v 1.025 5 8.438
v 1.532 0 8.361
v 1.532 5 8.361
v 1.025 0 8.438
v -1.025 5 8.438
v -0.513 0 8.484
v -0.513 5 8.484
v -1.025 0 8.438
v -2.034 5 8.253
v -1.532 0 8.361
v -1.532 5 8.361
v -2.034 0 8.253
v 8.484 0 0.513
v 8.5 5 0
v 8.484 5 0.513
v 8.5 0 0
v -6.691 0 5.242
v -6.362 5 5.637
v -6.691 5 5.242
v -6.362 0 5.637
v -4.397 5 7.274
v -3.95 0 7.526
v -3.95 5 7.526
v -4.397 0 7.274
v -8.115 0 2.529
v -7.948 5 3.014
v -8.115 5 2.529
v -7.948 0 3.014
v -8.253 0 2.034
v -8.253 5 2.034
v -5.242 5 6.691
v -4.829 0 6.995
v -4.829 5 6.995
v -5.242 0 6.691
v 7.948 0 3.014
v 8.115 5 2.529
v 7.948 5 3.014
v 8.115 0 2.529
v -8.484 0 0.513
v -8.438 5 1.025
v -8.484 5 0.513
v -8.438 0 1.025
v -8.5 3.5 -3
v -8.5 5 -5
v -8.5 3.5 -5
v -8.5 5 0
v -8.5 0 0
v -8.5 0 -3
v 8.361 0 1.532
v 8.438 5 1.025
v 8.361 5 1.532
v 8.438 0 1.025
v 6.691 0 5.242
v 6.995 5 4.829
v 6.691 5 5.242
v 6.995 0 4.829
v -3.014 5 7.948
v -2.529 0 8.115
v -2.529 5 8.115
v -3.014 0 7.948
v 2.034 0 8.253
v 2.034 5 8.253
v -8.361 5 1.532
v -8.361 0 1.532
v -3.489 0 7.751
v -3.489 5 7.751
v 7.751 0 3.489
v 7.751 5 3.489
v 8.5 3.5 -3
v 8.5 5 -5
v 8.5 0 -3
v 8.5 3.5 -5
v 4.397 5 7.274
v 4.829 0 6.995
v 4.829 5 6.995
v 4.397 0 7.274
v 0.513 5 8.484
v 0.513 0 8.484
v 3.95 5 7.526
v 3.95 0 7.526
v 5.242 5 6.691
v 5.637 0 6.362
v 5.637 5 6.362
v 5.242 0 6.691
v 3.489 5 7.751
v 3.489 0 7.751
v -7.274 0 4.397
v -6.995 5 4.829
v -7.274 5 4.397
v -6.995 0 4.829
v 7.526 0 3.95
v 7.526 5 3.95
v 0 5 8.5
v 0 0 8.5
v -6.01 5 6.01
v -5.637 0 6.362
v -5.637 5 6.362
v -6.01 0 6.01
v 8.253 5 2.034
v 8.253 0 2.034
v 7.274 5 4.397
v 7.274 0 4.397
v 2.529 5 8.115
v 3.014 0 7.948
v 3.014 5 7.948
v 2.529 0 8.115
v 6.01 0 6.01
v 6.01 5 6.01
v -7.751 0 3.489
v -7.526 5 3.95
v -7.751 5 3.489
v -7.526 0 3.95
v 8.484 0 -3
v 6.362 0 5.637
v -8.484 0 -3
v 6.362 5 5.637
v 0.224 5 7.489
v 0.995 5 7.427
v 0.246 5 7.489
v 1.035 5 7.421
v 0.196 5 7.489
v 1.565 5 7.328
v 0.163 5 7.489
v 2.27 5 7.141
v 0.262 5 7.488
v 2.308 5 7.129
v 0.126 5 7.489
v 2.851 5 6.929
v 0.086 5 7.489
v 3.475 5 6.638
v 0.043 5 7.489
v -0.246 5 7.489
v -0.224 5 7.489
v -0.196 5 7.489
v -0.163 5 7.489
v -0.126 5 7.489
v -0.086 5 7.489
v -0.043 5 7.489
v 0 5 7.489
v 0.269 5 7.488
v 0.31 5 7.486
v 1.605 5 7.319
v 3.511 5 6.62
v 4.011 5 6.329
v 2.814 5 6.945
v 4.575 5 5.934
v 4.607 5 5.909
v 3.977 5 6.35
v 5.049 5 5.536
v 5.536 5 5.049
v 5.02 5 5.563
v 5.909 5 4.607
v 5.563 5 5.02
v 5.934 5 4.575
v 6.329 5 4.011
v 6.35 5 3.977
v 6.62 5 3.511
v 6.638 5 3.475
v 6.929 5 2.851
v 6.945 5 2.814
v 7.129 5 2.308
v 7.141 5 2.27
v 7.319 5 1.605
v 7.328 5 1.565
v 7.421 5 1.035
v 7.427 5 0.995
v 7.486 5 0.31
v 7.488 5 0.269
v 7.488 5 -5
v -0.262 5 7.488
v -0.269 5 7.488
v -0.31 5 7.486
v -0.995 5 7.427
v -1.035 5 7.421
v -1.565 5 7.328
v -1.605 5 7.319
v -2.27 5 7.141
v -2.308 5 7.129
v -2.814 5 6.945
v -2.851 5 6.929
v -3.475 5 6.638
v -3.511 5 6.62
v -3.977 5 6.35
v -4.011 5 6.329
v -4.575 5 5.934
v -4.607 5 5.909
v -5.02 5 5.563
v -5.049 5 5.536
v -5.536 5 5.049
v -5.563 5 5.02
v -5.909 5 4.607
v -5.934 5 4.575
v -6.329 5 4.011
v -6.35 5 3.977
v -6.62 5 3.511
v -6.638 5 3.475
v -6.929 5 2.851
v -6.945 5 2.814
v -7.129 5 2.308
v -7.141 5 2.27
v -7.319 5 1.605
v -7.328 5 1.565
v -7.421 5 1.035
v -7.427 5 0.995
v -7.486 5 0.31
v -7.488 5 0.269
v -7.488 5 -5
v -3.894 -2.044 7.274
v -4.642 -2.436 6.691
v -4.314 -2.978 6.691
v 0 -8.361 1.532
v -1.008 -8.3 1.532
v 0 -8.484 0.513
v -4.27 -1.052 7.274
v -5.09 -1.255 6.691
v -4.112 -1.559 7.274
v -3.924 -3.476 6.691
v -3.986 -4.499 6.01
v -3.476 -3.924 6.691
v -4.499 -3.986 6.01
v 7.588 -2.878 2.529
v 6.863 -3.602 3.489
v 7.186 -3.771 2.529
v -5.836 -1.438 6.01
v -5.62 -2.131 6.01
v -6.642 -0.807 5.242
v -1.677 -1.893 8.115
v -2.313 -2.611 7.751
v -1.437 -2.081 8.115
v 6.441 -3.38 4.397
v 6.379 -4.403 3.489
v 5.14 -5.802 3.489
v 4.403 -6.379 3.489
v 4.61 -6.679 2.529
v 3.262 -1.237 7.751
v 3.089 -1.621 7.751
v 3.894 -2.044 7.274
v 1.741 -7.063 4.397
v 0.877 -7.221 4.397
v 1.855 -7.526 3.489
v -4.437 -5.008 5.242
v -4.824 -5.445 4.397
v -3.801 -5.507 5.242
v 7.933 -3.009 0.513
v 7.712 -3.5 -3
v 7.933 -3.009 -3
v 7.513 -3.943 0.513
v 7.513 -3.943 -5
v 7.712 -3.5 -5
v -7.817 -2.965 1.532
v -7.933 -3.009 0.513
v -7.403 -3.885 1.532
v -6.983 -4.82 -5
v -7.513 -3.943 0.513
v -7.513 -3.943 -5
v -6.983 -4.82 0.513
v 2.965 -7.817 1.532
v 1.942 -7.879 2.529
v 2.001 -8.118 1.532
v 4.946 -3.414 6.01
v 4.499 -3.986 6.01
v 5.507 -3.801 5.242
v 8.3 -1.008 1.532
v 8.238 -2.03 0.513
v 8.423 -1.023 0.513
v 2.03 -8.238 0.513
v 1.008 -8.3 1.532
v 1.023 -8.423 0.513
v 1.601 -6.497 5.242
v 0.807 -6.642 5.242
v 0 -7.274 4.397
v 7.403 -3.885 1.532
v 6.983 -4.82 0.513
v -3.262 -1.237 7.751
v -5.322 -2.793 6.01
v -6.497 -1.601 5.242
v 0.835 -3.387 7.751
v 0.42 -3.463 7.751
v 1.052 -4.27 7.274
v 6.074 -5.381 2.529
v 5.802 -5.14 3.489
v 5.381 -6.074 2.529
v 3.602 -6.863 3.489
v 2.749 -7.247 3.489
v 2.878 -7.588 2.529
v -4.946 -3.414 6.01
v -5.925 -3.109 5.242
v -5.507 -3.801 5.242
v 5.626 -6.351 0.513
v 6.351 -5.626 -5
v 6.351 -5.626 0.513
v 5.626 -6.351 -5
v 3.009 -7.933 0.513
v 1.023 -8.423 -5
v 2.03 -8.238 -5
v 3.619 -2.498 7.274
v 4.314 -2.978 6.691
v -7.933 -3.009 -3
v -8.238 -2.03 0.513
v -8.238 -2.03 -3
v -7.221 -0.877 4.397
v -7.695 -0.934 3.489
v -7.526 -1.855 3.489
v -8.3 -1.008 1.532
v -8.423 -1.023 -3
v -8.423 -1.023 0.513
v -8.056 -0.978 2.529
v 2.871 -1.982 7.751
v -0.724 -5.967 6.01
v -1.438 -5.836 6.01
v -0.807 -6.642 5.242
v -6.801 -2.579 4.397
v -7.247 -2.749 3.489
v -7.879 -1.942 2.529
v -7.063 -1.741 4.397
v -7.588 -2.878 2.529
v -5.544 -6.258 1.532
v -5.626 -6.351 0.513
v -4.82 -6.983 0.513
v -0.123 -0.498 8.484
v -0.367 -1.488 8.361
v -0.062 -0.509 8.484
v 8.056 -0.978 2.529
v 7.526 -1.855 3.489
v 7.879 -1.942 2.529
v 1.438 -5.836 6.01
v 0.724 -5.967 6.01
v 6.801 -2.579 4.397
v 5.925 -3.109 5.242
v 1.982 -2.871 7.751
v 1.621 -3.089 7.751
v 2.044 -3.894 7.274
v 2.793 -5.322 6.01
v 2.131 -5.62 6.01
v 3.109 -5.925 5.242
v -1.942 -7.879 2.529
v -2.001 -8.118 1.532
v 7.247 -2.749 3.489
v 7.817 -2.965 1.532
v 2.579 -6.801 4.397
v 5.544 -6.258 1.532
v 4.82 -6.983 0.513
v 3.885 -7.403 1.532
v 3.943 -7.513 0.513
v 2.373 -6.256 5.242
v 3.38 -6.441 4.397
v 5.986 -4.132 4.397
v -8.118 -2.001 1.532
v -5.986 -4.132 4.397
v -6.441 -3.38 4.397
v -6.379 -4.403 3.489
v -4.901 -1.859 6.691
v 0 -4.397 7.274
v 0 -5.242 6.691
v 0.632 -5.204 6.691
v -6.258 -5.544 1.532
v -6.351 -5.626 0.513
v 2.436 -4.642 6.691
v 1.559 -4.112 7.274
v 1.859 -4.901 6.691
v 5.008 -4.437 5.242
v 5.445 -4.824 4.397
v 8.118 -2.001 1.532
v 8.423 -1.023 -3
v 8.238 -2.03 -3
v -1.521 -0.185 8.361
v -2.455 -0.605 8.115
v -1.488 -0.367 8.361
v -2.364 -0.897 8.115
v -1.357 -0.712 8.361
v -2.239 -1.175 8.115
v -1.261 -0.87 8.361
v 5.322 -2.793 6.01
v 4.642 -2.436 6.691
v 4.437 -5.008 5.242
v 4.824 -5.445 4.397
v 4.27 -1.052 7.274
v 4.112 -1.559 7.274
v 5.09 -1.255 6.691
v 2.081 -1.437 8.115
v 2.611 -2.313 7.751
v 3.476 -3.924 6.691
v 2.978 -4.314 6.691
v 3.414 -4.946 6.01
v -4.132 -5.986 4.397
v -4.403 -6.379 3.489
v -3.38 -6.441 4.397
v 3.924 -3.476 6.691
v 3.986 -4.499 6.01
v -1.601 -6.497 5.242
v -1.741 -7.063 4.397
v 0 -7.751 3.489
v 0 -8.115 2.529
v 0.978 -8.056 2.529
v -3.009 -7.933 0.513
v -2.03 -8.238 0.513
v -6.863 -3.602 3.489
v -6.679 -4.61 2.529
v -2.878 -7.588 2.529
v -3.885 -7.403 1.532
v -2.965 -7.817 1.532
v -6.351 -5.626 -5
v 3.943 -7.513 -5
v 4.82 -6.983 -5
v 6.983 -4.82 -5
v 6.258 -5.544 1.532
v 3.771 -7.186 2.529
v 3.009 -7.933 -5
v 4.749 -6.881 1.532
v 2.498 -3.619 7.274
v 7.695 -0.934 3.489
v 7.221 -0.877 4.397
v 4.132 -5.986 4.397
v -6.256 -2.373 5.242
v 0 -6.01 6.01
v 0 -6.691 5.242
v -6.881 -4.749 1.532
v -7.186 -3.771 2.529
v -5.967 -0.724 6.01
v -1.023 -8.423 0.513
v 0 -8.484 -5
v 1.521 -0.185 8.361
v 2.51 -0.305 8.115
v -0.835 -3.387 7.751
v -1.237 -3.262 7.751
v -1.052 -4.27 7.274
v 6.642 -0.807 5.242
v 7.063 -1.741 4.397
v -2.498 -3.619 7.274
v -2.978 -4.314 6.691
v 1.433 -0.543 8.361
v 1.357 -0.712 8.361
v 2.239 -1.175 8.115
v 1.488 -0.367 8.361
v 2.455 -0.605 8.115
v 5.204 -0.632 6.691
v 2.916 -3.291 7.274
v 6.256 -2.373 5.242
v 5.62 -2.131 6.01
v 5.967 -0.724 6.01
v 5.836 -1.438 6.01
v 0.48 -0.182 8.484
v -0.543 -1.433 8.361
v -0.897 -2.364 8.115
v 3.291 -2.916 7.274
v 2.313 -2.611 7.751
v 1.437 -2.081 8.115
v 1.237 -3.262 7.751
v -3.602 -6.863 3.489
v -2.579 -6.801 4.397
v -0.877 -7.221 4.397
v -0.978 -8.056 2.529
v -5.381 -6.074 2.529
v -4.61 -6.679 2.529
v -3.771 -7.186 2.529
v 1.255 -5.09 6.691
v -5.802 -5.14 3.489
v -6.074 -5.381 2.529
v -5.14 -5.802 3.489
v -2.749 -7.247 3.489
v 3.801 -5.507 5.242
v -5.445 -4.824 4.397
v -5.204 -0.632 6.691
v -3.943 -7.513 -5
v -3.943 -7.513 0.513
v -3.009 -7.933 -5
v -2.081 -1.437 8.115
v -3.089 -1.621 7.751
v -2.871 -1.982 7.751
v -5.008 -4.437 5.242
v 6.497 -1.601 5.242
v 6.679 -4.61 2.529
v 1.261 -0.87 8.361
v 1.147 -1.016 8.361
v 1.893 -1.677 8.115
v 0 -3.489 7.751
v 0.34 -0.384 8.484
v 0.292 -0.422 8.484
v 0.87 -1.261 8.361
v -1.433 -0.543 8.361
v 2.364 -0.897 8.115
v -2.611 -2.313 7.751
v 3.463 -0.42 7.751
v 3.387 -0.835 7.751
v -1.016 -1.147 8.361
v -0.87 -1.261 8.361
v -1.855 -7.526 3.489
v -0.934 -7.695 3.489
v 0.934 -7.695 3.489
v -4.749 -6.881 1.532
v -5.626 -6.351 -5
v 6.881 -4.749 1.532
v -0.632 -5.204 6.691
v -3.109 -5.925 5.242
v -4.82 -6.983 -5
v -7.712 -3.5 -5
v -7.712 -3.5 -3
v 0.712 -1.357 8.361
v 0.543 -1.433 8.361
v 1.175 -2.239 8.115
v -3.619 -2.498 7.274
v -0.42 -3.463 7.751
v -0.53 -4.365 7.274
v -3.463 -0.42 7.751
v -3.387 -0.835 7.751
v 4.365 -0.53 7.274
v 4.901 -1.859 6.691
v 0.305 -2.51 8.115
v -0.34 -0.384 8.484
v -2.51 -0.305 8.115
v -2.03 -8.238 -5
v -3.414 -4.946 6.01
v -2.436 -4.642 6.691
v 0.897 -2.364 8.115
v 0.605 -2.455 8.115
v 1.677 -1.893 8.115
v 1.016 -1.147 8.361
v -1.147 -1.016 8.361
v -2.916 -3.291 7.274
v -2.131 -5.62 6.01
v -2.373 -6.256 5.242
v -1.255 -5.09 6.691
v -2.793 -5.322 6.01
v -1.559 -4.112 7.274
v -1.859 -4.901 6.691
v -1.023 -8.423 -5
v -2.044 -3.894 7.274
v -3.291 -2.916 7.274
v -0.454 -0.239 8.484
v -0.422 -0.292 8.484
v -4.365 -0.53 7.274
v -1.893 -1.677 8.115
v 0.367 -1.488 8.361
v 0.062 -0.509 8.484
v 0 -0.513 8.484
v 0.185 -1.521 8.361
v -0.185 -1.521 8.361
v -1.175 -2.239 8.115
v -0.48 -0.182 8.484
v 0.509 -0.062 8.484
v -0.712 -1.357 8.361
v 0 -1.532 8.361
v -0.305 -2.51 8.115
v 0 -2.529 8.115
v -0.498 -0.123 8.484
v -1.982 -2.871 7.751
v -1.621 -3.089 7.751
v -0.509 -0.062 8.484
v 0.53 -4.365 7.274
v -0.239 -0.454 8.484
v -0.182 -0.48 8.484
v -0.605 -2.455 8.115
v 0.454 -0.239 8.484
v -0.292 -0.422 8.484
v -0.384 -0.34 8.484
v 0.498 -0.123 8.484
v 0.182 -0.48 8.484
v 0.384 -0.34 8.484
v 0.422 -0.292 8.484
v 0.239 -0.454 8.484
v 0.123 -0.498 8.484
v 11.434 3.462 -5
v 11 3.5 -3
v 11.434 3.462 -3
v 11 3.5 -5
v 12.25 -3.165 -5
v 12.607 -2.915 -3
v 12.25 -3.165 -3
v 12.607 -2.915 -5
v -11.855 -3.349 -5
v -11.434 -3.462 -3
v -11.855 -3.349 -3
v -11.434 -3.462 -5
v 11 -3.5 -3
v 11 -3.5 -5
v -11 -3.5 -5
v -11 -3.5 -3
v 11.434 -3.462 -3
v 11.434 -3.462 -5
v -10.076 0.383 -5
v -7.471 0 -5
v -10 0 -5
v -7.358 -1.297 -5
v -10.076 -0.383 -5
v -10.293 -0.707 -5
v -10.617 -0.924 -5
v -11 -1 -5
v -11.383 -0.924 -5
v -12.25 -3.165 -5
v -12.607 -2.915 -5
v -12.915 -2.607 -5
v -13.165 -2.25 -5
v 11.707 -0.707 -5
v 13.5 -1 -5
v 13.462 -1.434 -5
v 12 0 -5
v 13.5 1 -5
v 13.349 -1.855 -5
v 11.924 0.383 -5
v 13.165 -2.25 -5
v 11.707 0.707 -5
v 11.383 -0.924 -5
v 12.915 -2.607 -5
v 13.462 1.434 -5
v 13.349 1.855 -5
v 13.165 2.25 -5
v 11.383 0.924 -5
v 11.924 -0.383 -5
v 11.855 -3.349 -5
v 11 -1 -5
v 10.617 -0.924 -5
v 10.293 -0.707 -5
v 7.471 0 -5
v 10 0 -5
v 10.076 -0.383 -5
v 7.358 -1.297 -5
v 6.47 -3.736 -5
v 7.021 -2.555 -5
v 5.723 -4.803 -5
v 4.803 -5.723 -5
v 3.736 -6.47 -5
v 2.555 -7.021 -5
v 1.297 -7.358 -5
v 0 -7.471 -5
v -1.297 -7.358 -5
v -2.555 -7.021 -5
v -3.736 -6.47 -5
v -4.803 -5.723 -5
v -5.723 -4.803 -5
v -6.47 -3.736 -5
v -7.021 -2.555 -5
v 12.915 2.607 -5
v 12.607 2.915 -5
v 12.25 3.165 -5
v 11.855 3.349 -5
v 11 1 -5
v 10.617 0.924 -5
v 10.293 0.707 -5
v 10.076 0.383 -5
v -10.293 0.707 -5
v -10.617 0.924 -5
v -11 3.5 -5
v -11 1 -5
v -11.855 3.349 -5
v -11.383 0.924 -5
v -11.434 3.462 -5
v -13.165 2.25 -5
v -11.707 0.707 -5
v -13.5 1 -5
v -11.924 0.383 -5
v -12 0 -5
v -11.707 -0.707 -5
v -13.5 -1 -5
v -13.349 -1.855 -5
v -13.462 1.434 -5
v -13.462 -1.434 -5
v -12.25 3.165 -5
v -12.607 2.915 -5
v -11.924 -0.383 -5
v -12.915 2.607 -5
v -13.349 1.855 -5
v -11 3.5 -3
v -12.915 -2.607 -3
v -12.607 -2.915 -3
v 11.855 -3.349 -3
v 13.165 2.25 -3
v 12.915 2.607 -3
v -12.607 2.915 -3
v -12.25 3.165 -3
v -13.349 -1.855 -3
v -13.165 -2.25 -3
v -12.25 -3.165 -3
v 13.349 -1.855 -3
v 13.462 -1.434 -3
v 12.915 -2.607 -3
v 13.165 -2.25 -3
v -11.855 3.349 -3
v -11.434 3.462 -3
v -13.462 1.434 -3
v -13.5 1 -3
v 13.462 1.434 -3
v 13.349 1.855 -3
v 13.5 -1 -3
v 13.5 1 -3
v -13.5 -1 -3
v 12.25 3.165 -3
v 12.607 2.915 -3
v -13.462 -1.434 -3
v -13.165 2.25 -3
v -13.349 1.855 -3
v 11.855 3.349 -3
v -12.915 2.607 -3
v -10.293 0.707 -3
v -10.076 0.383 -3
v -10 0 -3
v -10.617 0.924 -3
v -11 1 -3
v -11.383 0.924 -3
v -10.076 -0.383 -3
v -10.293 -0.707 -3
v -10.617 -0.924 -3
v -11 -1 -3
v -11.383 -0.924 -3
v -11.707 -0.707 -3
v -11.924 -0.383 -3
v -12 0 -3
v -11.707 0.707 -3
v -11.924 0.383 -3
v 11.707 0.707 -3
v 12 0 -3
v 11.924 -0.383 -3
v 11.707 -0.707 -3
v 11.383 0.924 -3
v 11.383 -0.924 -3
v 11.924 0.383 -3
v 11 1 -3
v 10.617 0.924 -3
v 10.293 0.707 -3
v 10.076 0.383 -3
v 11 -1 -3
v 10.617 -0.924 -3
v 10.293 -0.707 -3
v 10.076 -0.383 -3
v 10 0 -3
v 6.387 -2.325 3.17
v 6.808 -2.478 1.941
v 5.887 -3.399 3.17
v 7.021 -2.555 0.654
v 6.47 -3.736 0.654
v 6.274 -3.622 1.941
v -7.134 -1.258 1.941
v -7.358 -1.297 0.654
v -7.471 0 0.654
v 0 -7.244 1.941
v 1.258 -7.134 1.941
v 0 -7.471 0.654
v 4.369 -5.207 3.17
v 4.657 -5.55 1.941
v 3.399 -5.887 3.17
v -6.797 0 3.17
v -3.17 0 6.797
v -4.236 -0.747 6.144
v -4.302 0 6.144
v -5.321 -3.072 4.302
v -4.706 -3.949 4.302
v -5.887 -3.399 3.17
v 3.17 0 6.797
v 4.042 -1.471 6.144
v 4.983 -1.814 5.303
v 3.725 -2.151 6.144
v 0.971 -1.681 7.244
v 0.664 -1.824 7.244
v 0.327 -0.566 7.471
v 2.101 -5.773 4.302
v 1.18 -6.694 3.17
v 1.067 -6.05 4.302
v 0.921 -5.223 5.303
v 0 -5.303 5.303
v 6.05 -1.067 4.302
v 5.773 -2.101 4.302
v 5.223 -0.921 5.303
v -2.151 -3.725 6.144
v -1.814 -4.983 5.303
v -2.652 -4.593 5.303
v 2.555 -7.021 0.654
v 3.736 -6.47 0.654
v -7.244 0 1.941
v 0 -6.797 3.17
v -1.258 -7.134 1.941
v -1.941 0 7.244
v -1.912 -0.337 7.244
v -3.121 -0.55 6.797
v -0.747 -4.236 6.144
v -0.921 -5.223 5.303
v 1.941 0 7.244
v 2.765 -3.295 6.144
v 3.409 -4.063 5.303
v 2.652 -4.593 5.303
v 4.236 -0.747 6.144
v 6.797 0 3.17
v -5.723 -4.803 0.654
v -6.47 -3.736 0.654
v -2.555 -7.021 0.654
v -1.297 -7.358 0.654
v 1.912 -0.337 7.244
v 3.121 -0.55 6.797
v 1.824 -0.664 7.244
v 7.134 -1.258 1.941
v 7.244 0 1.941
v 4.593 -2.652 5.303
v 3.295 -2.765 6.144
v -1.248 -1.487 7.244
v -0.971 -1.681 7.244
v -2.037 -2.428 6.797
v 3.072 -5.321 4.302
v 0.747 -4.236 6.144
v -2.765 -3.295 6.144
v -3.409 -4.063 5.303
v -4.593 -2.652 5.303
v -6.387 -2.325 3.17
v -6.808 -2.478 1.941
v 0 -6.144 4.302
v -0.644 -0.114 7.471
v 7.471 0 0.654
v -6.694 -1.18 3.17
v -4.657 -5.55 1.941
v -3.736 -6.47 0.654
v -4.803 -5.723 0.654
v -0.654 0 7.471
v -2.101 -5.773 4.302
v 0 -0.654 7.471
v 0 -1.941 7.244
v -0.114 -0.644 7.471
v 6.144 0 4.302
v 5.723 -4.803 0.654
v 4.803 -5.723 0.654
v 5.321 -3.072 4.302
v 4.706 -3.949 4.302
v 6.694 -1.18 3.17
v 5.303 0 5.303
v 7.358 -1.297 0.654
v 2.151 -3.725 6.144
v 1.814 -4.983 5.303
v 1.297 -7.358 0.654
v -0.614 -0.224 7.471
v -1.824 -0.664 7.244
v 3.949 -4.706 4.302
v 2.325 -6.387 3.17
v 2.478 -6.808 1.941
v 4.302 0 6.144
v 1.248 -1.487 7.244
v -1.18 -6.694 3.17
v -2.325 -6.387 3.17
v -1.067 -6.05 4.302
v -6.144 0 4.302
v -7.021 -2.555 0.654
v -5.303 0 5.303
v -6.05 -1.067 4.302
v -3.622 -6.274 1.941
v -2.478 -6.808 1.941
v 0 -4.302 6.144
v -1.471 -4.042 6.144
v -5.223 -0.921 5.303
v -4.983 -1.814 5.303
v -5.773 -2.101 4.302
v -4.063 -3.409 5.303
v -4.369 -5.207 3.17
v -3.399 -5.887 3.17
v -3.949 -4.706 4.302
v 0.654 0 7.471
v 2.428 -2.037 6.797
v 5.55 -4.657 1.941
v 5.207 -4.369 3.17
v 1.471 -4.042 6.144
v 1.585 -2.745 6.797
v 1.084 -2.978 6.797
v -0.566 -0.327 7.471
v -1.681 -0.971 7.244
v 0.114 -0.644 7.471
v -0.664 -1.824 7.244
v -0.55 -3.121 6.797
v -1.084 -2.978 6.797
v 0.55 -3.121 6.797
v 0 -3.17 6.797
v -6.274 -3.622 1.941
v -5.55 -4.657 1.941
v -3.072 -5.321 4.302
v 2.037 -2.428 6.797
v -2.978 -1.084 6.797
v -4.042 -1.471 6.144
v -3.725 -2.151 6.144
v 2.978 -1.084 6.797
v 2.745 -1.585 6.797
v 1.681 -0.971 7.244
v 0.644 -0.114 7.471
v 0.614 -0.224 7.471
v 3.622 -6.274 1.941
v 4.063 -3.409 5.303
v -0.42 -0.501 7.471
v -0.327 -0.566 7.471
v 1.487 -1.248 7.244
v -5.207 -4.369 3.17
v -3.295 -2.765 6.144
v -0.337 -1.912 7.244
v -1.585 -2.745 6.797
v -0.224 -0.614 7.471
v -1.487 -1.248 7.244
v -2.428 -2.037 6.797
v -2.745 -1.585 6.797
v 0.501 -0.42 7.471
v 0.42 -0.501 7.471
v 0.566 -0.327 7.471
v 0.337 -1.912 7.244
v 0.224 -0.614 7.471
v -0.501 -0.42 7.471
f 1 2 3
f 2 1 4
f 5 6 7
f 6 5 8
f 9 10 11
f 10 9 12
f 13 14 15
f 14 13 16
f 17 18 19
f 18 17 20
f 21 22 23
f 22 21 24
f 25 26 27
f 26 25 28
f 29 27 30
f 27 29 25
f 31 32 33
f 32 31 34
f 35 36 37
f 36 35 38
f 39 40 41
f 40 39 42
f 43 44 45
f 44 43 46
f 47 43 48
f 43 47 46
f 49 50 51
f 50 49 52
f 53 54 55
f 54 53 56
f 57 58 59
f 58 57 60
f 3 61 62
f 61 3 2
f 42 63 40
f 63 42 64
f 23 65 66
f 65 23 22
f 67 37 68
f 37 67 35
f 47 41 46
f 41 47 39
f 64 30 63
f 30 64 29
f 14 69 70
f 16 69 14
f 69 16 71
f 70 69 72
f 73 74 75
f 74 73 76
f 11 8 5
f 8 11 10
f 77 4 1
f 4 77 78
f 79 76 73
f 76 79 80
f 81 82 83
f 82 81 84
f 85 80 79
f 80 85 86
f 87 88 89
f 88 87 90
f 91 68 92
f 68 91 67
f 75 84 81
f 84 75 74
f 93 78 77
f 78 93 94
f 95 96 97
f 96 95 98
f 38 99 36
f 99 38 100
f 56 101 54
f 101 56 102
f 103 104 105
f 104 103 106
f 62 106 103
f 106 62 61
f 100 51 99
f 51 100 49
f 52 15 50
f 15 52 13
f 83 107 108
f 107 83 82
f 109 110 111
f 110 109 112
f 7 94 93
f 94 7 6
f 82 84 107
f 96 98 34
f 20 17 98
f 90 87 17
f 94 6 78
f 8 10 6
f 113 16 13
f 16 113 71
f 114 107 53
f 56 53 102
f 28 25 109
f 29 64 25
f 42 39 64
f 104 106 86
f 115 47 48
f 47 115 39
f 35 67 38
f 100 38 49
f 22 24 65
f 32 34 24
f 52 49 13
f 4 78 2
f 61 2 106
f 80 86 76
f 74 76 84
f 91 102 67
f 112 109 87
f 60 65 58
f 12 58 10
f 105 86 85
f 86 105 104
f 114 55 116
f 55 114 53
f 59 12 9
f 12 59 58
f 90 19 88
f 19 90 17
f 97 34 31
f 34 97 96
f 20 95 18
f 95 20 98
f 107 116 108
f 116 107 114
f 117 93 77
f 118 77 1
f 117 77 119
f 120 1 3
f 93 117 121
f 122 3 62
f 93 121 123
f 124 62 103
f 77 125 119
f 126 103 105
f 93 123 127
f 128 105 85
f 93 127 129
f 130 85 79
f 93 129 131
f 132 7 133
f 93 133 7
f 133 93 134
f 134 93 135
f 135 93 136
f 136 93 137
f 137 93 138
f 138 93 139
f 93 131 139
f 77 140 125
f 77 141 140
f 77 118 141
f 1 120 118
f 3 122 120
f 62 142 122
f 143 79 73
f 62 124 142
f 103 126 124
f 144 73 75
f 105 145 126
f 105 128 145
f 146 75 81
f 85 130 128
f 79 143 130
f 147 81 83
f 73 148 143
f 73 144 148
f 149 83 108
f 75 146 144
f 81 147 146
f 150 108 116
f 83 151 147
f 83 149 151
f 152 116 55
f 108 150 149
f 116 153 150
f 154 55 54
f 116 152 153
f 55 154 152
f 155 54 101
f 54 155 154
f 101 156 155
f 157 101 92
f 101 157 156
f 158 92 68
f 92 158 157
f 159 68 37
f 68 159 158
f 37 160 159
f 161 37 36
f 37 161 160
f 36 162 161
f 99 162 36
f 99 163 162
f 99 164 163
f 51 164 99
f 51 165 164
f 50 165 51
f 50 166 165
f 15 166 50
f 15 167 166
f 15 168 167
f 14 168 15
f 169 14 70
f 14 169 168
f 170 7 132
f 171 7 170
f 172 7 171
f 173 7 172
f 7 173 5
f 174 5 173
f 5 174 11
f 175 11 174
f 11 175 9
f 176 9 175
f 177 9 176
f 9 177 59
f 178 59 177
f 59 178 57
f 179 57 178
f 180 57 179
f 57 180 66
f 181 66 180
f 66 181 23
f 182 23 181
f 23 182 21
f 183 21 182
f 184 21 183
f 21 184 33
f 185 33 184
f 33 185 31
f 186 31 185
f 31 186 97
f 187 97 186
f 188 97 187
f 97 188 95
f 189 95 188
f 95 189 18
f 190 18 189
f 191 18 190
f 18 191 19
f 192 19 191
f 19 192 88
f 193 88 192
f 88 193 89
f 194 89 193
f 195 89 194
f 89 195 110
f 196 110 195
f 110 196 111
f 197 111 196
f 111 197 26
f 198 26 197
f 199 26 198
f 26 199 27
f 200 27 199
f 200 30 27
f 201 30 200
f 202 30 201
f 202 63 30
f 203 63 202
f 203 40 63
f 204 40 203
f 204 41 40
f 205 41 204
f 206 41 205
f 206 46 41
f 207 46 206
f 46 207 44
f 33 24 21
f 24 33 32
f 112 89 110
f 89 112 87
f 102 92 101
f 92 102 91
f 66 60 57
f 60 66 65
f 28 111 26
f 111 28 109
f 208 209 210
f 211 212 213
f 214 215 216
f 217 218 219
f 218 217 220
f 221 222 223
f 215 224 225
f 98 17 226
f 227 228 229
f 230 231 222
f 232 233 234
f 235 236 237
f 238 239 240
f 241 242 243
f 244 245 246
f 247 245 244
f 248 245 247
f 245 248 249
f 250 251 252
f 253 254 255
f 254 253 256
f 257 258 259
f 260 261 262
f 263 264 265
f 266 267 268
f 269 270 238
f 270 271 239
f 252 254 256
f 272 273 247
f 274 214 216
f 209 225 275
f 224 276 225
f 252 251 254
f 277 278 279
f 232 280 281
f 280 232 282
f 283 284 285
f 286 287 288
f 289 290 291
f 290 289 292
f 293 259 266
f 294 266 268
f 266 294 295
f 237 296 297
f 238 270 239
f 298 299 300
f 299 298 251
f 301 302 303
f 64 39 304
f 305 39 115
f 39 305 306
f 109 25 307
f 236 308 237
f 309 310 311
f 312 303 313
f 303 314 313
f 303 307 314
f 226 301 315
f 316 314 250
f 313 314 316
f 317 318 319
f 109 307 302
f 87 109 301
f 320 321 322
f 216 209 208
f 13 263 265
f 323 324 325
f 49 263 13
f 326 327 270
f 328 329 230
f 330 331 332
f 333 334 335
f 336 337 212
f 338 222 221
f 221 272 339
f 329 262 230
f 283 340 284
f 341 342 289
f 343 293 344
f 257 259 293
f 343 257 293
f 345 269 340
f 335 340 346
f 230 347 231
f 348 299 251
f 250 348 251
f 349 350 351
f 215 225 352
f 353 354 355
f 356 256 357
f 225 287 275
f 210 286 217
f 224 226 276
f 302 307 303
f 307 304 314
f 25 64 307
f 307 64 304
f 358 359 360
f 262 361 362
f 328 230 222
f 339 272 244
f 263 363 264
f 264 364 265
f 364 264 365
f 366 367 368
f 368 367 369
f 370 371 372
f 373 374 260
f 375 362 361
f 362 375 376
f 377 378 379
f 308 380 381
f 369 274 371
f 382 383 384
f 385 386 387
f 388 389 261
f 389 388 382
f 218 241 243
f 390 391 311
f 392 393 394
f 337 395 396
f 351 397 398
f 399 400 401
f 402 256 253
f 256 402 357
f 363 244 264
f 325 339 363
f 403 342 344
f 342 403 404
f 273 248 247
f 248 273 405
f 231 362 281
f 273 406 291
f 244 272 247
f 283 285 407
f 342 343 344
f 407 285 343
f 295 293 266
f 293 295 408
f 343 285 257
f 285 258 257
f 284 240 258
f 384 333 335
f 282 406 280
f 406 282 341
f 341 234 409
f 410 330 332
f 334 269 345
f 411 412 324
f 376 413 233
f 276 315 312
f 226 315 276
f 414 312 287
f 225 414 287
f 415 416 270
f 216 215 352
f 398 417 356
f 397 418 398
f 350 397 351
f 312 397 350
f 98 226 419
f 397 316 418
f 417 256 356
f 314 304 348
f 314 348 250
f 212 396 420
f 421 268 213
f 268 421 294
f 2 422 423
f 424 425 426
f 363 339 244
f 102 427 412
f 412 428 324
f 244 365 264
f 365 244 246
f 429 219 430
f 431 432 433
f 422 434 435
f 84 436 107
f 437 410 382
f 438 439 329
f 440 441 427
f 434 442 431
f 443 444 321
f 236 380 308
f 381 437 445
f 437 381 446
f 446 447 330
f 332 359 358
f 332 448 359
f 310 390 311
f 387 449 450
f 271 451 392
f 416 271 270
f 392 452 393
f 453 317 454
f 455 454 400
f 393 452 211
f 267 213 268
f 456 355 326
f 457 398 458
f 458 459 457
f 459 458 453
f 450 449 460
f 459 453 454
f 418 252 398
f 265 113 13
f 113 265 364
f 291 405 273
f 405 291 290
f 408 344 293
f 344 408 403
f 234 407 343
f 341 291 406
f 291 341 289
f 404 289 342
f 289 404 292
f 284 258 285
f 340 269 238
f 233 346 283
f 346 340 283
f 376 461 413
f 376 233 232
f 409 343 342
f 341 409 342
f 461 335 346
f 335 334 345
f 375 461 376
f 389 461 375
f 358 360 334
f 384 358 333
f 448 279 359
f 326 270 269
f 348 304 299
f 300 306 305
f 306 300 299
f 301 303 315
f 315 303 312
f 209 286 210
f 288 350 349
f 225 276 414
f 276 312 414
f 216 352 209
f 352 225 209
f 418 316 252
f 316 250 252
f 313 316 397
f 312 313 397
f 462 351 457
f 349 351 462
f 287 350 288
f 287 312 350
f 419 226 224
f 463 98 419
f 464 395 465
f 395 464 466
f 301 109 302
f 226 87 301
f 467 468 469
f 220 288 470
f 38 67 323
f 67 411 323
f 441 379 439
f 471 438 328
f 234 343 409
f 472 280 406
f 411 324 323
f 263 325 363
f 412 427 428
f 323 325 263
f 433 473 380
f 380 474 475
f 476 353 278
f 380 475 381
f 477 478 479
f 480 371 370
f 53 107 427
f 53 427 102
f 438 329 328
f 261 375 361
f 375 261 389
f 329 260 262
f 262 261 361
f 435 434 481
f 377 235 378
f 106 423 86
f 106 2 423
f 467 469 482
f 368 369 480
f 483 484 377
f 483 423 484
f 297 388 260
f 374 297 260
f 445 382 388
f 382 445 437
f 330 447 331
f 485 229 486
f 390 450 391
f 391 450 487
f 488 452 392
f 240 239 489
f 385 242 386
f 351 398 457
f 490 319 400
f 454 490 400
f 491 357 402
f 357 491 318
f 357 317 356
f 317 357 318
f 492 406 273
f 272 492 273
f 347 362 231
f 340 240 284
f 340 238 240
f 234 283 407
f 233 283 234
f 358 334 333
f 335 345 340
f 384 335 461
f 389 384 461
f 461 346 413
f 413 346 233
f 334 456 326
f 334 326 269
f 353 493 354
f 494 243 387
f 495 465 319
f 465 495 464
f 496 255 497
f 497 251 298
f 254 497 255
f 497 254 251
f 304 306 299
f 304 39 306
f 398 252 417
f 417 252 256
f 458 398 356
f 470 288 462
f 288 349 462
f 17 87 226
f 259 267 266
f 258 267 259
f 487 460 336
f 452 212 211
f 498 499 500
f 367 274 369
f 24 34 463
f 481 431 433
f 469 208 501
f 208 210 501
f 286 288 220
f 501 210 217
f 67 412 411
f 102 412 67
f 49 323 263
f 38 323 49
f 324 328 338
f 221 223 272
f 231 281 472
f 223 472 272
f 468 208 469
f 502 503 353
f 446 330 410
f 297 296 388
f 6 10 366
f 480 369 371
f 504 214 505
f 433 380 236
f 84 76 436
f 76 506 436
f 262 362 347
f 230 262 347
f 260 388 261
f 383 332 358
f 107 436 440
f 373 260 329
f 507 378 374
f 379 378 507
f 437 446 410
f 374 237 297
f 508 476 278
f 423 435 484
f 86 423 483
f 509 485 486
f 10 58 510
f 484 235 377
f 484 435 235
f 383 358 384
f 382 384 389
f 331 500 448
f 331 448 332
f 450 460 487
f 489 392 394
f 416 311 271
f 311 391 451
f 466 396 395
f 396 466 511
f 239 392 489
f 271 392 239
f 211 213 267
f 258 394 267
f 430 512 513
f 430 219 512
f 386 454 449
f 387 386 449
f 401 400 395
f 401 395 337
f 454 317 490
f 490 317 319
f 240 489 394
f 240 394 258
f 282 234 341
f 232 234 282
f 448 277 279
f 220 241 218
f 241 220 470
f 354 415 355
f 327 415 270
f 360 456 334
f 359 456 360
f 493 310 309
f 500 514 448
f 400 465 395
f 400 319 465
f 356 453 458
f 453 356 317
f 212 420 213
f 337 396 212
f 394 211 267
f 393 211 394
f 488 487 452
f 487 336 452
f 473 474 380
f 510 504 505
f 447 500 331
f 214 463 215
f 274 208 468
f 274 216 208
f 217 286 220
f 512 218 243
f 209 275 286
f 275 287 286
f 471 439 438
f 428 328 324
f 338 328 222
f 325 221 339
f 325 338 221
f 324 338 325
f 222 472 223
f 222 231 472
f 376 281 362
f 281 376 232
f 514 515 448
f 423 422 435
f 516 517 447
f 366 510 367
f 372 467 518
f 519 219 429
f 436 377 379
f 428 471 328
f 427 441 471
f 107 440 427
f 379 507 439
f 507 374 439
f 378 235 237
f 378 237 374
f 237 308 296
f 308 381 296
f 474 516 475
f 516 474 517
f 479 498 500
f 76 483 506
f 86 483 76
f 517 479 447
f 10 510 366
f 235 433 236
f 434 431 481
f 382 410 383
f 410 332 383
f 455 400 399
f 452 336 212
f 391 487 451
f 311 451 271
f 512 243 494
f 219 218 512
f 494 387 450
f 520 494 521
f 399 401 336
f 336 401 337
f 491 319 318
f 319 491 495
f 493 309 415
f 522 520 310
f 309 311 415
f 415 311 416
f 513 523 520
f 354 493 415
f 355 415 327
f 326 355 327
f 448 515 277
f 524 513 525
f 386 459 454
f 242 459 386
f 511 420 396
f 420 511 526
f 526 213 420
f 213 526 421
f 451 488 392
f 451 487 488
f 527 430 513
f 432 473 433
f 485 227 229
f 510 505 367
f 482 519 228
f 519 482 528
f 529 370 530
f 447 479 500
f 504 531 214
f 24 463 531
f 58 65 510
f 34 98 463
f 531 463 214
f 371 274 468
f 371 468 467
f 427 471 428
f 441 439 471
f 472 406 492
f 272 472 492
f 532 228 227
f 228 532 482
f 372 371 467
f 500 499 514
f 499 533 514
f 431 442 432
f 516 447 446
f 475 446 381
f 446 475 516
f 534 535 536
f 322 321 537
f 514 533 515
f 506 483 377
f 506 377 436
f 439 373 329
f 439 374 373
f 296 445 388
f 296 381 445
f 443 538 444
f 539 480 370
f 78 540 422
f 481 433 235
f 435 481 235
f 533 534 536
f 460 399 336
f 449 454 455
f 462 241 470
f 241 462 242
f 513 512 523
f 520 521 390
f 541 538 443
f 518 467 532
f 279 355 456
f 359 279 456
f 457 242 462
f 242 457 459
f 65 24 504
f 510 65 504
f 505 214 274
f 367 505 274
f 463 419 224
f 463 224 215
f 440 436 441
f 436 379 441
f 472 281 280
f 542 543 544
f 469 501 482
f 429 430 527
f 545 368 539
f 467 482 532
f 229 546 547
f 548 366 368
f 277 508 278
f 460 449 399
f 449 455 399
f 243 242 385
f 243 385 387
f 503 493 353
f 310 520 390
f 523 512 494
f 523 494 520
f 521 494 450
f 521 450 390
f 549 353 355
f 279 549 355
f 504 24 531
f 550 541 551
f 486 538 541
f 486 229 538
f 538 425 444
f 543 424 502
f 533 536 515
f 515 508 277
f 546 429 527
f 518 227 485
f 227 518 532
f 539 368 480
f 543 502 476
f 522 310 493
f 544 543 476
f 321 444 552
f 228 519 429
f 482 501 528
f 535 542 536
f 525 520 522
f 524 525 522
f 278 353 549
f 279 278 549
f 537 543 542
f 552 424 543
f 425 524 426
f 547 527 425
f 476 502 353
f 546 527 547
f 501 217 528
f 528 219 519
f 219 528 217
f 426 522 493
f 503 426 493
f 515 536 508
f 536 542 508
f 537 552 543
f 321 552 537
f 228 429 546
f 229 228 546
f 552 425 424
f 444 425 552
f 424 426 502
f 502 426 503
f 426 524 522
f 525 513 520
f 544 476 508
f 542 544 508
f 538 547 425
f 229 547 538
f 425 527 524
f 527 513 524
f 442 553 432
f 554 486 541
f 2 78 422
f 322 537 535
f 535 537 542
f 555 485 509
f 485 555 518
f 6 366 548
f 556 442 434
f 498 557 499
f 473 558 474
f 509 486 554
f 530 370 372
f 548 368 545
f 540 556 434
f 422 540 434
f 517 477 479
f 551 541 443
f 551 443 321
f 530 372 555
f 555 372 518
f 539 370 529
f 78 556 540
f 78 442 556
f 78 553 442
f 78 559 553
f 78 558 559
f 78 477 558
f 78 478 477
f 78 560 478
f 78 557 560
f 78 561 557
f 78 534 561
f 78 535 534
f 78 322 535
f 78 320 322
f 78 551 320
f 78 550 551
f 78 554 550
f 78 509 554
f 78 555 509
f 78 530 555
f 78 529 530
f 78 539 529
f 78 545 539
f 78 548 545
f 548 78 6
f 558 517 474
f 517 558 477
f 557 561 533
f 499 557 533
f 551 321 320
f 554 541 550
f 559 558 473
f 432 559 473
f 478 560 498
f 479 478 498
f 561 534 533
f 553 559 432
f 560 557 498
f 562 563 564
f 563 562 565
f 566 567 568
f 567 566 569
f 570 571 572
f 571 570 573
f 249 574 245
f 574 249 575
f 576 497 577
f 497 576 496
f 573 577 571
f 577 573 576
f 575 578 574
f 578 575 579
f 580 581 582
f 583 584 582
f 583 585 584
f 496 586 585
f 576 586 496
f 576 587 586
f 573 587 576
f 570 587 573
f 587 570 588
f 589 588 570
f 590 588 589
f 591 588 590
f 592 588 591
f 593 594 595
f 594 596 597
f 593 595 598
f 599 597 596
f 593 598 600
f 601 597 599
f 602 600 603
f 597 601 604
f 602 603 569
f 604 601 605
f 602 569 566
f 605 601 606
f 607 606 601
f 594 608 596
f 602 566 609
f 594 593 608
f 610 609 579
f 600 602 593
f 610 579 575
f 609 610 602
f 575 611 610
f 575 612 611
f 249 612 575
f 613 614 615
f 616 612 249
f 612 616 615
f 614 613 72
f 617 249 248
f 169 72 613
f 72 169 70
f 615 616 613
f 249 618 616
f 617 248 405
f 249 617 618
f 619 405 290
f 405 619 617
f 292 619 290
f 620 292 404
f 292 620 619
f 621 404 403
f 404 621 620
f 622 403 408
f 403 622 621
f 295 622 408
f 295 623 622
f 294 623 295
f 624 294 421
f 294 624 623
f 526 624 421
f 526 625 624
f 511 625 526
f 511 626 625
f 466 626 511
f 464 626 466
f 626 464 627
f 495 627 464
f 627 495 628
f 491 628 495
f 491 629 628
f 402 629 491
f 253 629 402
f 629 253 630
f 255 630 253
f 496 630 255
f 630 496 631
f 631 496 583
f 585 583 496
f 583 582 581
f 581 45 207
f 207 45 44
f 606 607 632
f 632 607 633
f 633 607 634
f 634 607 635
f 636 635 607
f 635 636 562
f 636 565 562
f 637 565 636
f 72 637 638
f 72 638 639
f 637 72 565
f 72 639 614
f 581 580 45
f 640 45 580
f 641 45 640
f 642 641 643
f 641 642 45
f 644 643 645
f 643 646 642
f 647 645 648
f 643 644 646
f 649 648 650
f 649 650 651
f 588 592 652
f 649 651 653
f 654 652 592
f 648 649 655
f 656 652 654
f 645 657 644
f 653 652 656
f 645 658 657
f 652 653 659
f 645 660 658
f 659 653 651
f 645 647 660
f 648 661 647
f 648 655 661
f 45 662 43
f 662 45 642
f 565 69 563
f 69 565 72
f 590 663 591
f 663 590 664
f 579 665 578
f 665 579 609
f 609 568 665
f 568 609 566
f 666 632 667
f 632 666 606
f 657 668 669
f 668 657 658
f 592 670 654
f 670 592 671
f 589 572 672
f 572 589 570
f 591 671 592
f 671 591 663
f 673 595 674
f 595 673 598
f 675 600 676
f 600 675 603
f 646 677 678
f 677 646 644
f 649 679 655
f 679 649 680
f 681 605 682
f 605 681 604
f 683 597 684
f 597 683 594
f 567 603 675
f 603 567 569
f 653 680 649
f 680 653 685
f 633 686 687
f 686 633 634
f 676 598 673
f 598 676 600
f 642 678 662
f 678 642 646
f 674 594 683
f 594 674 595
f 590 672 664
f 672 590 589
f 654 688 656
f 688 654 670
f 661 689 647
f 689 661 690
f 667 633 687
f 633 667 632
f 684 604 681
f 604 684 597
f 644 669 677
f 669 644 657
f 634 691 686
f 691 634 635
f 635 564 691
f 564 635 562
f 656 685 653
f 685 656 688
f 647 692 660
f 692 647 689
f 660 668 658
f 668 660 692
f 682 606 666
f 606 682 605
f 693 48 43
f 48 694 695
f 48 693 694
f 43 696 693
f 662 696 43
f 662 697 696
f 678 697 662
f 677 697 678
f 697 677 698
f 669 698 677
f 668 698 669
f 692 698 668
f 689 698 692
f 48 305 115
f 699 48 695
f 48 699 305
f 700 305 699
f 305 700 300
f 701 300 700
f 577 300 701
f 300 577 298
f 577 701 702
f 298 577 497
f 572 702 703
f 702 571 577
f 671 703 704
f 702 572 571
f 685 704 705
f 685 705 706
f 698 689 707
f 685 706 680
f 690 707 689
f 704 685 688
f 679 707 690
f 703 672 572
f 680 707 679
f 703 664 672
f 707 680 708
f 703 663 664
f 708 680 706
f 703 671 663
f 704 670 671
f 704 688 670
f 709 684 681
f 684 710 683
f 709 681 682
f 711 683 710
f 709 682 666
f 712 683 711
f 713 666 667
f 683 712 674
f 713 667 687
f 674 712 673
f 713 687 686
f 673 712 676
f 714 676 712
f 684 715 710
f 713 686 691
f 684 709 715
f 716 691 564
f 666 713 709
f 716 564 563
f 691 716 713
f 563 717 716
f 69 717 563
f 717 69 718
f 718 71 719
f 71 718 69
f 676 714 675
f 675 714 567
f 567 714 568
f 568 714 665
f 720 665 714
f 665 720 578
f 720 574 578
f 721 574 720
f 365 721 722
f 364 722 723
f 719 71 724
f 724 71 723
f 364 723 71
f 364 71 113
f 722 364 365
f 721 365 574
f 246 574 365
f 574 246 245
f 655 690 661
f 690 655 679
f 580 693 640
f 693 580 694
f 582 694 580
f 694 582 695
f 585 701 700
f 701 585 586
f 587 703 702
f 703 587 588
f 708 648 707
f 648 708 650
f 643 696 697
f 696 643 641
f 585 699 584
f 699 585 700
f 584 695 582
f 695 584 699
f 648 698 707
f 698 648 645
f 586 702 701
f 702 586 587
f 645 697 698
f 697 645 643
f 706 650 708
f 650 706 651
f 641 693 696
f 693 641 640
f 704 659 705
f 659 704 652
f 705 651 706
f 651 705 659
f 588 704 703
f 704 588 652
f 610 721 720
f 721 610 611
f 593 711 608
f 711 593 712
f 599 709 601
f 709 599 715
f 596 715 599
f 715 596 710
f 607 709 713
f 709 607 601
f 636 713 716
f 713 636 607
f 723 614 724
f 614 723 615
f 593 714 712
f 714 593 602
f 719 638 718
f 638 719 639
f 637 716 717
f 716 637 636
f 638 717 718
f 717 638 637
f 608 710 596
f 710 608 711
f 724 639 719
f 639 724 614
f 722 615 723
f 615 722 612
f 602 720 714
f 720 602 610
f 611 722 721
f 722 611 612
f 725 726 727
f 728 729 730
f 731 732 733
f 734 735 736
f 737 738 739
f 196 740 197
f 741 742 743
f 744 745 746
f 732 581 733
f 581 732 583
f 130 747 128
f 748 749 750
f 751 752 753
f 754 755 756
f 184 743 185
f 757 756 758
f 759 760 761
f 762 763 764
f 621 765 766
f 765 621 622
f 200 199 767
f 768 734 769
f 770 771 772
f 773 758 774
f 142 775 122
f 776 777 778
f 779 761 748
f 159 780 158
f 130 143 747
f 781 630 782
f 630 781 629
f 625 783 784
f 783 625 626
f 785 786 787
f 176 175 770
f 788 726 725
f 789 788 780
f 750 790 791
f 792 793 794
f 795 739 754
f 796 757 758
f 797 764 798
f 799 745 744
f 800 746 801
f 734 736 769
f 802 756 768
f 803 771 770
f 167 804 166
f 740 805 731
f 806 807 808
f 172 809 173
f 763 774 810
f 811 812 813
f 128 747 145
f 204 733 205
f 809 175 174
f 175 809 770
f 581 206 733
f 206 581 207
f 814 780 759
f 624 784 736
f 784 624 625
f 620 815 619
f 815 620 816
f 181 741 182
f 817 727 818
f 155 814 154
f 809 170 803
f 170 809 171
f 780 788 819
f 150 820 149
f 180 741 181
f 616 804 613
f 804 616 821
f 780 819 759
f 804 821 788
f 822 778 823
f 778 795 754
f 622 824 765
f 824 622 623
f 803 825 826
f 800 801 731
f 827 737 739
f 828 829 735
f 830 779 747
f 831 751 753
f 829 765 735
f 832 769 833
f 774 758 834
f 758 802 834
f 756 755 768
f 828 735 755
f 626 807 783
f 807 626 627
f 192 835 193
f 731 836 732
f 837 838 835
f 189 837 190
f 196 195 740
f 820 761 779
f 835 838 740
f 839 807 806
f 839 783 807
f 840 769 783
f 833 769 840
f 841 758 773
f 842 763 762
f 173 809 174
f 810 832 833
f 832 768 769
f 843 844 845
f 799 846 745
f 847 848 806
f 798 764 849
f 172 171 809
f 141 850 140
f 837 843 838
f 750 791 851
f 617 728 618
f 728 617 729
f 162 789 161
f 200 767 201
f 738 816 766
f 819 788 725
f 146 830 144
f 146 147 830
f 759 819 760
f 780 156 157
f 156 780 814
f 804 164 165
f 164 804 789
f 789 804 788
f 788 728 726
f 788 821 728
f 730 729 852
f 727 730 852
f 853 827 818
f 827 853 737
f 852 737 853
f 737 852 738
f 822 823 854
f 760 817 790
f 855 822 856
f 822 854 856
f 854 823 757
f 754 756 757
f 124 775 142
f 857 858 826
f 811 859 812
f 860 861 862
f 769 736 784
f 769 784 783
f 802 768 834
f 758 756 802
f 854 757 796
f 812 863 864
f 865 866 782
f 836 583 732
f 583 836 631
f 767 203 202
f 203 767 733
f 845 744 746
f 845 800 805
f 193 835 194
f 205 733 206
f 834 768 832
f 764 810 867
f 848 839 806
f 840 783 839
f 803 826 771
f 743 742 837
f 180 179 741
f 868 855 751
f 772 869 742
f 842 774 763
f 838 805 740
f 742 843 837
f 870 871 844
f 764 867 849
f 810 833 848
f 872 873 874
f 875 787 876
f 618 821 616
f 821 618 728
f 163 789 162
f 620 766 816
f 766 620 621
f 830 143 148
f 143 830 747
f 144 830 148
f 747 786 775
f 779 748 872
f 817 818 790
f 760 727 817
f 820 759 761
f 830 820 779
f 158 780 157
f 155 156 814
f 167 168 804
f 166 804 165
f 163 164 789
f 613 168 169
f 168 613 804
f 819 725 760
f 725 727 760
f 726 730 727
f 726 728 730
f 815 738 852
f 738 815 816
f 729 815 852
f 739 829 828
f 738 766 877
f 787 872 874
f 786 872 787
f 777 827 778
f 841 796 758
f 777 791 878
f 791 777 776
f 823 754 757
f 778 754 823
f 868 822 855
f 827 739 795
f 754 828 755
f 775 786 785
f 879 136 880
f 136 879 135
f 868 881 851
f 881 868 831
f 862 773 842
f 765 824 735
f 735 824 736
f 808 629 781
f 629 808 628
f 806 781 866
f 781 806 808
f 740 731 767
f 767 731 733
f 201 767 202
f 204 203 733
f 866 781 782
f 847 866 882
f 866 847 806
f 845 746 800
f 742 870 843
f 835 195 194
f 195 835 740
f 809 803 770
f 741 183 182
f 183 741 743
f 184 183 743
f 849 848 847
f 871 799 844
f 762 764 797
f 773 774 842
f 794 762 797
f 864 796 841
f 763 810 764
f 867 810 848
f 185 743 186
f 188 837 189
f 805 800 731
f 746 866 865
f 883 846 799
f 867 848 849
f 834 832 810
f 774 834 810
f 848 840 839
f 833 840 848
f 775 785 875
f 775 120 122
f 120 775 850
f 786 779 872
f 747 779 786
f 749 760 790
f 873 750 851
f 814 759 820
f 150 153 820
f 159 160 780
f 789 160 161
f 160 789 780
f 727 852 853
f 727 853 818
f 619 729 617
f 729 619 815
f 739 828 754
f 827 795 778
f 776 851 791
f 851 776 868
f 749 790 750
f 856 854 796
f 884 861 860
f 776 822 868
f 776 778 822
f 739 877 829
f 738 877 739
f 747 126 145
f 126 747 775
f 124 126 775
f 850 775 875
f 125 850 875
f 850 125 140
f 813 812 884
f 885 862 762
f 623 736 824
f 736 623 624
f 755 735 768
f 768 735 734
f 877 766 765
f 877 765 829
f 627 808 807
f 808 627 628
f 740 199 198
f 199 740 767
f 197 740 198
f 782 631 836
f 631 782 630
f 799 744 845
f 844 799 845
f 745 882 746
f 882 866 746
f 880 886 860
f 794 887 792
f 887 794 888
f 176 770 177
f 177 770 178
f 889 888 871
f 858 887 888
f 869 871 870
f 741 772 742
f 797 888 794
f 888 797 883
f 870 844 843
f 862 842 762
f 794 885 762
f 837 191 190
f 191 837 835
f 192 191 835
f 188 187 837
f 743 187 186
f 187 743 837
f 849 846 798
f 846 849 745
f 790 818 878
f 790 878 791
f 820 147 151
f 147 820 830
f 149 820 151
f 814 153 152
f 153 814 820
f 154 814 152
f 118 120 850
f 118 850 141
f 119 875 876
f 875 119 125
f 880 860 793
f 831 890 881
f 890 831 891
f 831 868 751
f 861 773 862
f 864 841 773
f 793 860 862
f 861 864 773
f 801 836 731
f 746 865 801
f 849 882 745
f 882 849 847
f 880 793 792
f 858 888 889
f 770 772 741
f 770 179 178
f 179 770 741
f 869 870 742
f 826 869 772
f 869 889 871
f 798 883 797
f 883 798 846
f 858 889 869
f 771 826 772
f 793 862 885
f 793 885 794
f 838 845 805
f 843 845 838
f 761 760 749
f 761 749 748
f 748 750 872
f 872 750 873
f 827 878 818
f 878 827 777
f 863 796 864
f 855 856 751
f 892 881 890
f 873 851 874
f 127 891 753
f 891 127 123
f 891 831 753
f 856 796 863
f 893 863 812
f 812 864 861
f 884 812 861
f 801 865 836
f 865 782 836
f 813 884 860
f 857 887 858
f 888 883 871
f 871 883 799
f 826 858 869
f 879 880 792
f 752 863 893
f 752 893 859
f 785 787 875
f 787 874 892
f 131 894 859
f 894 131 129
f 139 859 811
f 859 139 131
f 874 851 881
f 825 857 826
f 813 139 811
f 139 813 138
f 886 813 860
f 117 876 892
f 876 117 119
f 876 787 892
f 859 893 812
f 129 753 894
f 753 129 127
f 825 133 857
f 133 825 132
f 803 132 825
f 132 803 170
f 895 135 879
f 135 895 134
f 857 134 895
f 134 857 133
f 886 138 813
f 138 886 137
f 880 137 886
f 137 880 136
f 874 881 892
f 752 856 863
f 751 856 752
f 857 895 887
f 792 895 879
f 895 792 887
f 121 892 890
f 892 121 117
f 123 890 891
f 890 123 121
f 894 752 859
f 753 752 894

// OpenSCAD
// Support
// translate([0, 30, -190]) cube([35, 20, 400], center=true);

module Panneau(tr = 5) {
// Plaque sous panneau solaire
    rotate([45,0,0]) difference() {
// façade
        hull() for (x=[-1,1]) for (y=[-1,1]) translate([x*(210/2-10),y*(115/2-10), tr]) cylinder(r=10, h=2, center=true);
// trous des vis            
        for (x=[-1,1]) for (y=[-1,1]) translate([x*195/2,y*100/2,5]) cylinder(r=2, h=3, center=true);
// trou du cable et attache
        translate([195/2-10,0,tr]) scale([1.5,1.0,1.0]) cylinder(r=10, h=3, center=true);
    }
};

module Boite(arrondi = 5, epaisseur = 2) {
    difference() {
        union() {
     // Tube du support
            translate([0,29.35,-11.8]) cube([39,24,59], center=true);

     // Boite
            difference() {
                hull() for (x=[arrondi-105,105-arrondi]) {
                    translate([x,41.35-arrondi,50-arrondi]) sphere(r=arrondi,$fn=36);
                    translate([x,arrondi-50,arrondi-41.35]) sphere(r=arrondi,$fn=36);
                    translate([x,41.35-arrondi,arrondi-41.35]) sphere(r=arrondi,$fn=36);
                }
                hull() for (x=[arrondi-105,105-arrondi]) {
                    translate([x,41.35-arrondi,50-arrondi]) sphere(r=arrondi-epaisseur,$fn=36);
                    translate([x,arrondi-50,arrondi-41.35]) sphere(r=arrondi-epaisseur,$fn=36);
                    translate([x,41.35-arrondi,arrondi-41.35]) sphere(r=arrondi-epaisseur,$fn=36);
                }
            }
            
    // Trous de fermeture (écrous)      
            intersection() {
                 rotate([45,0,0]) for (x=[-97.5,97.5]) for (y=[-50,50]) translate([x,y,-6.0]) cylinder(r=6,h=13,$fn=36,center=true);
                hull() for (x=[arrondi-105,105-arrondi]) for (i=[23,37]) {
                    translate([x,41.35-arrondi,i]) sphere(r=arrondi,$fn=36);
                    translate([x,-i,arrondi-41.35]) sphere(r=arrondi,$fn=36);
                }
            }
    // Épaulement du capteur US
        translate([70,0,-39]) cylinder(r=20,h=3,$fn=60,center=true);
        }

    // Trou de la barre
        translate([0,29.35,-15]) cube([35,20,61],center=true);
    // Trou de la vis de fixation
        translate([0,40.35,0]) rotate([90,0,0]) cylinder(r=2,h=3,center=true,$fn=16);
    // Tranchage de la façade
        translate([0,-7,7]) rotate([45,0,0]) cube([220,130,20],center=true);
    // Percement des trous de fixation de la façade
        rotate([45,0,0]) for (x=[-97.5,97.5]) for (y=[-50,50]) {
    // Trou du filetage
            translate([x,y,-1]) cylinder(r=1.75,h=3,$fn=16,center=true);
    // Trou de passage de l'écrou
            translate([x,y,-7]) cylinder(r=4,h=12,$fn=36,center=true);
        }
    // Trou du capteur US
        translate([70,0,-39.5]) cylinder(r=25/2+.25,h=5,$fn=36,center=true);
        
    // Goutte (rainure sur le dessous)
        hull() {
            translate([98,34.25,-43]) sphere(r=2.5,$fn=16);
            translate([98,-34.25,-43]) sphere(r=2.5,$fn=16);
        }
        hull() {
            translate([98,-34.25,-43]) sphere(r=2.5,$fn=16);
            translate([-98,-34.25,-43]) sphere(r=2.5,$fn=16);
        }
        hull() {
            translate([-98,-34.25,-43]) sphere(r=2.5,$fn=16);
            translate([-98,34.25,-43]) sphere(r=2.5,$fn=16);
        }
        hull() {
            translate([-98,34.25,-43]) sphere(r=2.5,$fn=16);
            translate([98,34.25,-43]) sphere(r=2.5,$fn=16);
        }

    // Épaulement & percements pour AM2302
        translate([0,0,-43]) cube([54,28,5],center=true);
        translate([22,0,-42]) cylinder(r=0.5,h=3,$fn=8);
        translate([-33,0,-42]) cylinder(r=2.5,h=3,$fn=16);
        translate([-33,11,-42]) cylinder(r=0.5,h=3,$fn=8);
        translate([-33,-11,-42]) cylinder(r=0.5,h=3,$fn=8);
    }

    // Tétons d'accrochage de la carte électronique
    difference() {
        translate([-60,7,-7]) rotate([45,0,0]) {
            for (y=[-82.25,82.25])
                for (x=[-62.25,62.25])
                    translate([x/2,y/2,-4]) difference () {
                        cylinder(r=4,h=7,$fn=16,center=true);
                        cylinder(r=0.5,h=8,$fn=16,center=true);
                    }
        }
        translate([0,0,-45]) cube([220,90,10],center=true);
        translate([0,45,0]) rotate([90,0,0]) cube([220,90,10],center=true);
    }
};

// Bouchon de AM2302
module Bouchon() {
    difference() {
        union() {
            hull() for(x=[-1,1]) for(y=[-1,1]) translate([11*x,y,-5]) cylinder(r=2.5,h=2,$fn=36);
            union() {
                hull() for(z=[0,-5]) {
                    translate([0,2.5,z]) rotate([90,0,0]) cylinder(r=8.5,h=5,center=true,$fn=104);
                }
                hull() for(z=[0,-5]) {
                    translate([0,0,z]) sphere(r=8.5,$fn=52);
                }
            }
        }
        hull() for(z=[0,-5]) {
            translate([0,9,z]) rotate([90,0,0]) cylinder(r=7.5,h=1,center=true,$fn=36);
            translate([0,0,z]) sphere(r=7.5,$fn=36);
        }
        translate([0,-1.75,-10]) cube([28,14.5, 10],center=true);
        for (x=[-1,1]) translate([x*11,0,-5 + 1]) cylinder(r=1,h=3,$fn=16,center=true);
    }
}



module GrandCote() {
    difference() {
        Boite();
        translate([85,0,0]) cube([100,100,100],center=true);
    };
};

module PetitCote() {
    intersection() {
        Boite();
        translate([85.25,0,0]) cube([100,100,100],center=true);
    };

    difference() {
        translate([35,0,-39]) cube([6,70,3], center=true);
        translate([32,0,-40]) cube([6.5,71,1.5], center=true);
    };

    difference() {
        translate([35,39,0]) cube([6,3,70], center=true);
        translate([32,40,0]) cube([6.5,1.5,71], center=true);
    };
};


// PetitCote();
// GrandCote();
Bouchon();
